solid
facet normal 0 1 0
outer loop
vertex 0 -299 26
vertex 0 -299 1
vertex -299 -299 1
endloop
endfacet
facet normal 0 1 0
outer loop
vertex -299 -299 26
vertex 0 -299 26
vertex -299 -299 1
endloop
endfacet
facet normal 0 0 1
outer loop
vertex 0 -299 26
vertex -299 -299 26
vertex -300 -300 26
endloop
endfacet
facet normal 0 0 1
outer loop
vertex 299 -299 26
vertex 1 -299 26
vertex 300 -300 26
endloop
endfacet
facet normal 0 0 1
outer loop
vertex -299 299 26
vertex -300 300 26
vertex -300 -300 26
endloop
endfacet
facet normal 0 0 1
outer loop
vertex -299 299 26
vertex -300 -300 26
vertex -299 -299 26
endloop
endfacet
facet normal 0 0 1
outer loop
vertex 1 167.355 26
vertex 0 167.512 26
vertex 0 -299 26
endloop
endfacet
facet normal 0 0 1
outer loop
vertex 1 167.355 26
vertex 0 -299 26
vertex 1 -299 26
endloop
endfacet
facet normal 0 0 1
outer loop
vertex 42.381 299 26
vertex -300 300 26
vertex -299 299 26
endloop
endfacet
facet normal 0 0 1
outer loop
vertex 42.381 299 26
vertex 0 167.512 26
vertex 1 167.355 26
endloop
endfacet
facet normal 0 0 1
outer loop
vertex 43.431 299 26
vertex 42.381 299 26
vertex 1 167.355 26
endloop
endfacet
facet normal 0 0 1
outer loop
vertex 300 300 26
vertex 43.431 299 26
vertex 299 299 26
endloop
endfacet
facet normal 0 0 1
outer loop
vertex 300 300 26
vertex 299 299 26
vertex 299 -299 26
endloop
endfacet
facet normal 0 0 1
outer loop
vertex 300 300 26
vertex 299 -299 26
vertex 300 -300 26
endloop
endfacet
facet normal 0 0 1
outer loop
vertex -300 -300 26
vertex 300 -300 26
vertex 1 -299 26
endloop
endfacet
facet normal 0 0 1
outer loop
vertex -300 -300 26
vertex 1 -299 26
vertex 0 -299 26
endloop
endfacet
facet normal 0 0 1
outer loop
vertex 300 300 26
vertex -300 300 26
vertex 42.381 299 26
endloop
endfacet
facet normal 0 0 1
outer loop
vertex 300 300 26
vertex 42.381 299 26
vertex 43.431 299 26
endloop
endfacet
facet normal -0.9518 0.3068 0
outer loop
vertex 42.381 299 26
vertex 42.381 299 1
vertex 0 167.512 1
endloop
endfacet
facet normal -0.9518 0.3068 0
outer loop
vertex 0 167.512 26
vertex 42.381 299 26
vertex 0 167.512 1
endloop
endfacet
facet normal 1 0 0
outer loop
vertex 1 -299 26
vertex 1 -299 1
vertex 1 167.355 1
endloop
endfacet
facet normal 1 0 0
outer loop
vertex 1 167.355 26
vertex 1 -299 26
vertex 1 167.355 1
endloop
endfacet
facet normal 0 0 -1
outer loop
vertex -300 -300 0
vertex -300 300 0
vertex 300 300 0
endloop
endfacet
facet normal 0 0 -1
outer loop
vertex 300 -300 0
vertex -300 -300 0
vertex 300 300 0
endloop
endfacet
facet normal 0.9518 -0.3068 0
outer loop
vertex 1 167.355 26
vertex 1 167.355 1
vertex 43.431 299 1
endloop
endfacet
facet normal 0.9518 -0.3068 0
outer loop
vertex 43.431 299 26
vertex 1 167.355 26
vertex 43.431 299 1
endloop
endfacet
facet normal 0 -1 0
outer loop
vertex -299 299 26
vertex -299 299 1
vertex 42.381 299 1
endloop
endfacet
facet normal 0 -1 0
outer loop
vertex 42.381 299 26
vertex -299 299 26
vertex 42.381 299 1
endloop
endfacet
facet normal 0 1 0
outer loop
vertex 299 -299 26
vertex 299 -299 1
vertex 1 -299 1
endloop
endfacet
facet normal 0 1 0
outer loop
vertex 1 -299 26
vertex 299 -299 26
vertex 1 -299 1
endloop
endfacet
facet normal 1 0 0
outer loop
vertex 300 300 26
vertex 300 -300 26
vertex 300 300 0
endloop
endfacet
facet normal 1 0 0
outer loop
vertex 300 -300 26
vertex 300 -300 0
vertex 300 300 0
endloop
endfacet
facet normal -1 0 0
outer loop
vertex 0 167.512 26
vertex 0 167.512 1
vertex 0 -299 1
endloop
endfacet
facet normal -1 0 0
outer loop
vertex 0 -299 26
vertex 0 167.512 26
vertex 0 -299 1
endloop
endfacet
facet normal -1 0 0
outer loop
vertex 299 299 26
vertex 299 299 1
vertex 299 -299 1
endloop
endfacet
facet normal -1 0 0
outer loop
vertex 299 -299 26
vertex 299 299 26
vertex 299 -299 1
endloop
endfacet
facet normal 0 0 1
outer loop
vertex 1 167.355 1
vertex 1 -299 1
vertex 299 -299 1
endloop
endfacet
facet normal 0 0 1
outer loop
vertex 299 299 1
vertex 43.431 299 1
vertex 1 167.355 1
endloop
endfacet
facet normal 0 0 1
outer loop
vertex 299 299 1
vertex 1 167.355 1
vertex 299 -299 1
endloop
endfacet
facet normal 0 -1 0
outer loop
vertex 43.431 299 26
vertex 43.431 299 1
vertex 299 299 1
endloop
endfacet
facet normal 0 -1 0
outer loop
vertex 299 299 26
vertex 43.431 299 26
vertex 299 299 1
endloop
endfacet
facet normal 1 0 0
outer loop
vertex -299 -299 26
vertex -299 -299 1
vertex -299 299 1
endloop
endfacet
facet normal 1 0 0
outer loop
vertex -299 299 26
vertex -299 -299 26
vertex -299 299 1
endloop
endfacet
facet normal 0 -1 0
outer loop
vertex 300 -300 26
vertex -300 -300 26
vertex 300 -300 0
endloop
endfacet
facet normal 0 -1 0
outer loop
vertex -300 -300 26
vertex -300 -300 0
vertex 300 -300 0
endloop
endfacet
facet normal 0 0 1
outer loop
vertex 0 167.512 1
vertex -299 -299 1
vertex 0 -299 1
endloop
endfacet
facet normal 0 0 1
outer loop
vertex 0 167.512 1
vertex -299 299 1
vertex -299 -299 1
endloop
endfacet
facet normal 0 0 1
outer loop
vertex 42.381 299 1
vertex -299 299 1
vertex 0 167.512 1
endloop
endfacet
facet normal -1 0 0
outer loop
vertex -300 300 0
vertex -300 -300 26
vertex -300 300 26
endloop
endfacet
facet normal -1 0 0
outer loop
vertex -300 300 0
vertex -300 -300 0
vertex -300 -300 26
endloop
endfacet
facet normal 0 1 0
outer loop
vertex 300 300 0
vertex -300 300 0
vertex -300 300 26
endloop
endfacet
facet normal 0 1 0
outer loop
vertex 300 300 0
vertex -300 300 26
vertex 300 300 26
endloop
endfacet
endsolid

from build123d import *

# Parameters (mm, degrees)
F0_W     = 600
F0_H     = 600
F1_DEPTH = 1
F2_W     = 600
F2_H     = 600
F3_DEPTH = 25


with BuildPart() as f1:
    # F0 (on Top) → F1 (new body)
    with BuildSketch(Plane.XY):
        Rectangle(F0_W, F0_H)
    extrude(amount=F1_DEPTH)

    # F2 (on face) → F3 (join)
    with BuildSketch(Plane.XY.offset(1)):
        Rectangle(F2_W, F2_H)
        Polygon((-299, -299), (-299, 299), (42.380814, 299), (0, 167.511806), (0, -299), align=None, mode=Mode.SUBTRACT)
        Polygon((43.431474, 299), (299, 299), (299, -299), (1, -299), (1, 167.354629), align=None, mode=Mode.SUBTRACT)
    extrude(amount=F3_DEPTH)


solid = f1.part
